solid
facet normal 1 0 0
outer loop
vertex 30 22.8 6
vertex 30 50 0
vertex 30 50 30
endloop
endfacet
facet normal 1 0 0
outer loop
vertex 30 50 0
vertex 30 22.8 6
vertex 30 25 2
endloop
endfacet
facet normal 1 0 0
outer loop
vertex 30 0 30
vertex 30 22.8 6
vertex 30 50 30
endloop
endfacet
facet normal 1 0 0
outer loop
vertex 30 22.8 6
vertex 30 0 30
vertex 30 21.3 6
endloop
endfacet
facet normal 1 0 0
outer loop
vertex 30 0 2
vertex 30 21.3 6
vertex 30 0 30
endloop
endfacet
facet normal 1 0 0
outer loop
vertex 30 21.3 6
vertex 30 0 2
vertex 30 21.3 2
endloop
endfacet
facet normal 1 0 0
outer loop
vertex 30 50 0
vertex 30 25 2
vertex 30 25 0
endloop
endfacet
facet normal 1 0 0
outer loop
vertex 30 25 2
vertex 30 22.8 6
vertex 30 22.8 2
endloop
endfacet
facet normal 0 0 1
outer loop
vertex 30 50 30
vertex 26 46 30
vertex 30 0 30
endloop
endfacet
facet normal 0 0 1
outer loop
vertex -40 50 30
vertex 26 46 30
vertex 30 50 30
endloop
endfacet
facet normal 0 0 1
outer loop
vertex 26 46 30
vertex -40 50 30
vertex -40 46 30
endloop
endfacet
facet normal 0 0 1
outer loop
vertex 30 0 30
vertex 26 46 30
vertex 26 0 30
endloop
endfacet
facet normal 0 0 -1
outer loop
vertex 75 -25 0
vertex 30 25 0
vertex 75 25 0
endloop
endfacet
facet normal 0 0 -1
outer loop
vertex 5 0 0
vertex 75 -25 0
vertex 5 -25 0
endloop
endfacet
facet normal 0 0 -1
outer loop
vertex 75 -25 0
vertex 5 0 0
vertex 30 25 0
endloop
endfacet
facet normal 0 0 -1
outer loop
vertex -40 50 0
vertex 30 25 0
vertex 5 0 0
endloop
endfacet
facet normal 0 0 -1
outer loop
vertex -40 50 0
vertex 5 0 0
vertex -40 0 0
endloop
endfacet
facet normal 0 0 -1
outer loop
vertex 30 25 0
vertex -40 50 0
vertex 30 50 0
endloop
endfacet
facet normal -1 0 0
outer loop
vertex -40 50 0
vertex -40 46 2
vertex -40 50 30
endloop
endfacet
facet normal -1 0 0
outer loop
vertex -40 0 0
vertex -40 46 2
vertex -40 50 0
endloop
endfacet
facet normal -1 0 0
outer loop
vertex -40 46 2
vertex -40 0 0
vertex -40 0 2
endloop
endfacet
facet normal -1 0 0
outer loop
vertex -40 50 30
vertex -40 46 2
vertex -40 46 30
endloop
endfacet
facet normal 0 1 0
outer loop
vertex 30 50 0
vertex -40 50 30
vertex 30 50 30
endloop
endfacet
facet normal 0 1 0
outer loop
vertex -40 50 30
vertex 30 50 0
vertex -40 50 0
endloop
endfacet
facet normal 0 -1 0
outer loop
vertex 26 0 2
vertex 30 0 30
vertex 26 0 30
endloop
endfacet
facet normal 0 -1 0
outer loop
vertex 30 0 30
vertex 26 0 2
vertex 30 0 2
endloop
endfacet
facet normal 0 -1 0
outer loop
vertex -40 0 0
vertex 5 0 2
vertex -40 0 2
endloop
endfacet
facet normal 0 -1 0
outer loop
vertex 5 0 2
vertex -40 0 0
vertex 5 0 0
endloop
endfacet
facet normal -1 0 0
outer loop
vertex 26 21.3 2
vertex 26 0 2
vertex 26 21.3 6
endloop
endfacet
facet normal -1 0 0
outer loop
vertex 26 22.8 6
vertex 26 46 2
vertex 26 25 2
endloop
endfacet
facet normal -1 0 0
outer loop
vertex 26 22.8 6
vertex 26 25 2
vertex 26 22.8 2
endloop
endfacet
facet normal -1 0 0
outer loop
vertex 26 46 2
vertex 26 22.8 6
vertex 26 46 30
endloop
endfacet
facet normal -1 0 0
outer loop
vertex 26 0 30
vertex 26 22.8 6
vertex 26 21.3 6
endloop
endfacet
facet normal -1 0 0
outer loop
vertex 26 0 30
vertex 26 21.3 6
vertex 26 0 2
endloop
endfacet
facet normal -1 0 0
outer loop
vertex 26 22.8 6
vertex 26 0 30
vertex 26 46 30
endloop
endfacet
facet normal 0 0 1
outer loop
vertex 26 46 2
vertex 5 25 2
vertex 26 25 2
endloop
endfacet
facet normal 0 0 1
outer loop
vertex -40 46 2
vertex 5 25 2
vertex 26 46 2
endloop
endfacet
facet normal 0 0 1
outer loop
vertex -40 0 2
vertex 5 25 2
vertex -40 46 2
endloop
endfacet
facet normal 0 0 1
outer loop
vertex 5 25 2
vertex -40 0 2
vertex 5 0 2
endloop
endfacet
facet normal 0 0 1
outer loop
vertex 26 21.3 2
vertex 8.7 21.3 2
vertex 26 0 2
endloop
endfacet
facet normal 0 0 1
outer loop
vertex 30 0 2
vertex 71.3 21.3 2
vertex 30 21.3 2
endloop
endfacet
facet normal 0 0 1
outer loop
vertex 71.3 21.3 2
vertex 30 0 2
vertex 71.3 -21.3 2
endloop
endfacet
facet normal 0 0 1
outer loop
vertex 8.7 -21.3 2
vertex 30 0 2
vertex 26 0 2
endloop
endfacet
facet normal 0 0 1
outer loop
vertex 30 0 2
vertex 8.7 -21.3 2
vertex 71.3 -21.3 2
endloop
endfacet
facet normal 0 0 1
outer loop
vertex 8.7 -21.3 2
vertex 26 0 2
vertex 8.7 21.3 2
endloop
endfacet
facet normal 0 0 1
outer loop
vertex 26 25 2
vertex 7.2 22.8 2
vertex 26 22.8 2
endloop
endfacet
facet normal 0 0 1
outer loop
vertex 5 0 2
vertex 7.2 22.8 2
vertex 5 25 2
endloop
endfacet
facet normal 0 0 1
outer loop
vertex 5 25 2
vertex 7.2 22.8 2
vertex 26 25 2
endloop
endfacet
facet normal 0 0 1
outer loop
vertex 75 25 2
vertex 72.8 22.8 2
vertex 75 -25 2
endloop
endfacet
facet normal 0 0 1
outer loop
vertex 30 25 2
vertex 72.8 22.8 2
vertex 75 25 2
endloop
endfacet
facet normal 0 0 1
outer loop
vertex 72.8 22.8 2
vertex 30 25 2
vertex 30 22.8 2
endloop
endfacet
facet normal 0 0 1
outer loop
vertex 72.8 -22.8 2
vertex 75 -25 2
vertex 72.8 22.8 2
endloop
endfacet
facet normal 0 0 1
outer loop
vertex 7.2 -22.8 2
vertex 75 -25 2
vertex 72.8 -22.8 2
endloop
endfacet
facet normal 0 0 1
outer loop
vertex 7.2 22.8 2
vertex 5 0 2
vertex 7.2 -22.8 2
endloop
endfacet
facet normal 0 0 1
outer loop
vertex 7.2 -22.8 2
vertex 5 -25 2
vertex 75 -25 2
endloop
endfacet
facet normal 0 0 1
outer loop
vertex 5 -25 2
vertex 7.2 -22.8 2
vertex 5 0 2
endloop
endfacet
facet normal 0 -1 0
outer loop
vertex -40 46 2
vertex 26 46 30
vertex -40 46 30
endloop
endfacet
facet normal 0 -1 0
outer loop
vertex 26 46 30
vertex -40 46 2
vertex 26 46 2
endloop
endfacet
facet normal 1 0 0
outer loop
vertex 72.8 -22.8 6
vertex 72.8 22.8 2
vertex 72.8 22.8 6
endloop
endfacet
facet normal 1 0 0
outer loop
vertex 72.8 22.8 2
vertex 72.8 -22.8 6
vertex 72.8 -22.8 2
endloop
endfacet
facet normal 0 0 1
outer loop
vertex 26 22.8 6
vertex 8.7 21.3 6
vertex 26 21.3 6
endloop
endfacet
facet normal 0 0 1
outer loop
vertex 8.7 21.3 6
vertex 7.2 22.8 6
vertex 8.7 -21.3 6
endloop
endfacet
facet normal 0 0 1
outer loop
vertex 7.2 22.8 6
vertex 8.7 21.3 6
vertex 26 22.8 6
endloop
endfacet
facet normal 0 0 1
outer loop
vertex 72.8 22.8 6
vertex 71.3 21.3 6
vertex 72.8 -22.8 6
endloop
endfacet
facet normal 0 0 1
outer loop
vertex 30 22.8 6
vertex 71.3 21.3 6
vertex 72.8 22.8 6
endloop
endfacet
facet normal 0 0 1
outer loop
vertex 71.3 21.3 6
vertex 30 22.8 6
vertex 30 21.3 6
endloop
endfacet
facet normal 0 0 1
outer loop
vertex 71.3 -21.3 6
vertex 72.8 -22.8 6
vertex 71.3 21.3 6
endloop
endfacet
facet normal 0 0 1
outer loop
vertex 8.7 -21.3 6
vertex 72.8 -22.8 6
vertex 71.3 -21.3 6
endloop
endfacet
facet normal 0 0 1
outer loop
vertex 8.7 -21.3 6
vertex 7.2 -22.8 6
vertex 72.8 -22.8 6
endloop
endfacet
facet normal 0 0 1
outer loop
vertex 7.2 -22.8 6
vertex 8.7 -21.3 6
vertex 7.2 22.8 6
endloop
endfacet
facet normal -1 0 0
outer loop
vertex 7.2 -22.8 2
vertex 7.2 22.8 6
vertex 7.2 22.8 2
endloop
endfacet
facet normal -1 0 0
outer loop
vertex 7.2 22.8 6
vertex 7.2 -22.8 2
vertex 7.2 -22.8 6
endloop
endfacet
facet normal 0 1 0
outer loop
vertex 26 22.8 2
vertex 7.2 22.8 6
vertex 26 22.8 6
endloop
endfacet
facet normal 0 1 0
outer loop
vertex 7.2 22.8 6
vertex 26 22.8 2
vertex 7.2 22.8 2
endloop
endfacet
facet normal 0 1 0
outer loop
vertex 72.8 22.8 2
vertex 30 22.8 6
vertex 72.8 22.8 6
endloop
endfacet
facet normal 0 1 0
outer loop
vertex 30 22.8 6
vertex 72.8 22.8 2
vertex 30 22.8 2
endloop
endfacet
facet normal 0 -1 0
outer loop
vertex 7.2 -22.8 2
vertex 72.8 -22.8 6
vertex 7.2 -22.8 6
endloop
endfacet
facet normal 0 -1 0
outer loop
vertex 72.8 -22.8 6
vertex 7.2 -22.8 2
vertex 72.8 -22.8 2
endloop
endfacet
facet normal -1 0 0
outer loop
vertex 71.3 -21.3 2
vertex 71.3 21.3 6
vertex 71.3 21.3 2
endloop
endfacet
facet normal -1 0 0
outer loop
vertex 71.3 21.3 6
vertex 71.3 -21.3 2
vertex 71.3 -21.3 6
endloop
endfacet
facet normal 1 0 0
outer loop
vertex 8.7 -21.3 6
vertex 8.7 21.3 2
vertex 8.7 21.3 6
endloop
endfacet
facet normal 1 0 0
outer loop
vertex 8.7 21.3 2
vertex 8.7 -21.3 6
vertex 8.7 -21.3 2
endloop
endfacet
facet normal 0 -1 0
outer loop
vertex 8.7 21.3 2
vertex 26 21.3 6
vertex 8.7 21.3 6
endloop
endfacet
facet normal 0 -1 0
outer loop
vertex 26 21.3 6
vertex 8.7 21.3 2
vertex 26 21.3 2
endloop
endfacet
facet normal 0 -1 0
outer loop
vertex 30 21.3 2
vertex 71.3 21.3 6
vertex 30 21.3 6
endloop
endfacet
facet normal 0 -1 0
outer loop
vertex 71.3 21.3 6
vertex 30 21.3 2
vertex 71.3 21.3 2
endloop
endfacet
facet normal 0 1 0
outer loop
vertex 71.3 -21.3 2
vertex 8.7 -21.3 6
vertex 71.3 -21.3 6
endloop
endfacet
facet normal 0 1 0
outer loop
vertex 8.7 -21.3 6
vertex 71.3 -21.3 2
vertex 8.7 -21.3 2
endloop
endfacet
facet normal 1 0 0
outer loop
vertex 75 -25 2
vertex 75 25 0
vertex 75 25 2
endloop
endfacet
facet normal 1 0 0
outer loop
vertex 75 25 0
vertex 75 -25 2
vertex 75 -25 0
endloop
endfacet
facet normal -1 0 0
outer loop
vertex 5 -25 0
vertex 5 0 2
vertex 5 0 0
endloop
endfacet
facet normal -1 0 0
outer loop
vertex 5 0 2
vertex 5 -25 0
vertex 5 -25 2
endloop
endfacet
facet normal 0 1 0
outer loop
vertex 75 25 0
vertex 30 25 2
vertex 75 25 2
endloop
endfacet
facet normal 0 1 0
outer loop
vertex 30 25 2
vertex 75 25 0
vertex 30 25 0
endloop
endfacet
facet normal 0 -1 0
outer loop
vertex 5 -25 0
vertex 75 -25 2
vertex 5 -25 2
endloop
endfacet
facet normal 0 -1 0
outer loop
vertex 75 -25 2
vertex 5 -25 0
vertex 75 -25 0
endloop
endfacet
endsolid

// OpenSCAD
// --- Dimensions ---
// Box outer dimensions
BOX_W = 70;
BOX_D = 50;
BOX_H = 30;

// Box wall and floor thickness
WALL_THICK = 2;
FLOOR_THICK = 2;

// Lid plate dimensions (matches box outer footprint)
LID_W = 70;
LID_D = 50;
LID_THICK = 2;

// Lid lip dimensions
LIP_THICK = 1.5;
LIP_H = 4;
LIP_W = 65.6;
LIP_D = 45.6;

// Clearance for lip sliding into box
CLEARANCE = 0.2;

// Gap between parts on the bed
GAP = 10;

// --- Calculated Internal Dimensions ---
// Box internal width/depth
BOX_IN_W = BOX_W - 2 * WALL_THICK;
BOX_IN_D = BOX_D - 2 * WALL_THICK;

// Box internal height (excluding floor)
BOX_IN_H = BOX_H - FLOOR_THICK;

// Lid lip inner dimensions (to fit inside box)
// The lip is the part that goes *inside* the box.
// Box inner width is BOX_IN_W. Lip outer width is LIP_W.
// We need LIP_W + CLEARANCE = BOX_IN_W? Or is LIP_W the target fit?
// User said: "outer size is 65.6 x 45.6 mm ... so it slides into the box opening with 0.2 mm clearance on each side."
// Box inner width = 70 - 2*2 = 66 mm.
// 66 - 65.6 = 0.4 mm total clearance -> 0.2 mm per side. This matches.
// So the lip outer dimensions are fixed by the user's fit requirement.

// --- Helper Variables ---
// Offset for difference operations to ensure non-coplanar faces
OFFSET = 0.05;

// --- Part 1: The Box ---
// Positioned on the left side
// Center X: - (BOX_W/2 + GAP/2)
// Center Y: 0
// Z: 0

PART1_OFFSET_X = -(BOX_W / 2 + GAP / 2);
PART1_OFFSET_Y = 0;

module Box() {
    // 1. Create the outer shell (solid block)
    // We build it as a solid block first, then subtract the inside.
    // This ensures the bottom and walls are solid.
    difference() {
        // Outer block
        cube([BOX_W, BOX_D, BOX_H], center = false);
        
        // Inner cavity (subtractive)
        // The cavity starts at Z = FLOOR_THICK
        // The cavity dimensions are BOX_IN_W x BOX_IN_D x BOX_IN_H
        // We extend the cavity slightly upwards to ensure the top rim is cut cleanly
        translate([0, 0, FLOOR_THICK]) {
            $fn = 64;
            cube([BOX_IN_W, BOX_IN_D, BOX_IN_H + OFFSET], center = false);
        }
    }
}

// --- Part 2: The Lid ---
// Printed upside down.
// The user specifies: "a plate 70 x 50 x 2 mm lying on the bed, with a rectangular lip on top of it"
// Since it is printed upside down, the "top" of the design (highest Z) will be the bottom of the physical lid.
// The "plate" rests on the bed (Z=0). The "lip" sticks up from the plate.
// When flipped over, the plate becomes the top cover, and the lip hangs down to fit into the box.

// Position: Center X: + (BOX_W/2 + GAP/2)
// Center Y: 0
// Z: 0

PART2_OFFSET_X = (BOX_W / 2 + GAP / 2);
PART2_OFFSET_Y = 0;

module Lid() {
    // 1. The Plate (rests on bed)
    // Dimensions: LID_W x LID_D x LID_THICK
    // Centered in X/Y
    translate([0, 0, LID_THICK / 2]) {
        $fn = 64;
        cube([LID_W, LID_D, LID_THICK], center = true);
    }
    
    // 2. The Lip (sticks up from the plate)
    // The lip is centered on the plate.
    // Outer size: LIP_W x LIP_D.
    // Height: LIP_H.
    // Thickness: LIP_THICK (This usually refers to the wall thickness of the lip itself).
    // Wait, "1.5 mm thick wall, 4 mm tall".
    // Does "1.5 mm thick" mean the wall thickness of the lip structure?
    // Yes, typically a lip is a hollow or solid rim.
    // If it's a "wall", it implies a rim.
    // Let's assume the lip is a hollow rectangular tube (rim) sitting on the plate.
    // Outer dimensions: LIP_W x LIP_D.
    // Wall thickness: LIP_THICK.
    // Height: LIP_H.
    
    // To model this:
    // We can create a solid block of LIP_W x LIP_D x LIP_H.
    // Then subtract a hole in the middle.
    // The hole dimensions:
    // Hole_W = LIP_W - 2 * LIP_THICK
    // Hole_D = LIP_D - 2 * LIP_THICK
    
    // However, the user said "rectangular lip ... whose outer size is ...".
    // And "1.5 mm thick wall".
    // So the lip is a rim.
    
    // Position of the lip:
    // It sits on the plate. The plate is at Z=0 to Z=LID_THICK.
    // The lip starts at Z = LID_THICK and goes up to Z = LID_THICK + LIP_H.
    
    lip_wall_thick = LIP_THICK;
    lip_outer_w = LIP_W;
    lip_outer_d = LIP_D;
    lip_height = LIP_H;
    
    // Inner dimensions of the lip hole
    lip_inner_w = lip_outer_w - 2 * lip_wall_thick;
    lip_inner_d = lip_outer_d - 2 * lip_wall_thick;
    
    // Ensure inner dimensions are positive
    if (lip_inner_w > 0 && lip_inner_d > 0) {
        difference() {
            // Outer lip block
            // Centered in X/Y, sitting on top of the plate
            translate([0, 0, LID_THICK + lip_height / 2]) {
                $fn = 64;
                cube([lip_outer_w, lip_outer_d, lip_height], center = true);
            }
            
            // Inner hole (subtractive)
            // Extend slightly to ensure clean cut
            translate([0, 0, LID_THICK + lip_height / 2]) {
                $fn = 64;
                cube([lip_inner_w, lip_inner_d, lip_height + OFFSET], center = true);
            }
        }
    } else {
        // If walls are too thick for the outer size, just make a solid block
        // This shouldn't happen with given dimensions (65.6 - 3 = 62.6 > 0)
        translate([0, 0, LID_THICK + lip_height / 2]) {
            $fn = 64;
            cube([lip_outer_w, lip_outer_d, lip_height], center = true);
        }
    }
}

// --- Assembly ---
// Use union to combine both parts into one object for printing
union() {
    // Part 1: Box
    translate([PART1_OFFSET_X, PART1_OFFSET_Y, 0]) {
        Box();
    }
    
    // Part 2: Lid
    translate([PART2_OFFSET_X, PART2_OFFSET_Y, 0]) {
        Lid();
    }
}
